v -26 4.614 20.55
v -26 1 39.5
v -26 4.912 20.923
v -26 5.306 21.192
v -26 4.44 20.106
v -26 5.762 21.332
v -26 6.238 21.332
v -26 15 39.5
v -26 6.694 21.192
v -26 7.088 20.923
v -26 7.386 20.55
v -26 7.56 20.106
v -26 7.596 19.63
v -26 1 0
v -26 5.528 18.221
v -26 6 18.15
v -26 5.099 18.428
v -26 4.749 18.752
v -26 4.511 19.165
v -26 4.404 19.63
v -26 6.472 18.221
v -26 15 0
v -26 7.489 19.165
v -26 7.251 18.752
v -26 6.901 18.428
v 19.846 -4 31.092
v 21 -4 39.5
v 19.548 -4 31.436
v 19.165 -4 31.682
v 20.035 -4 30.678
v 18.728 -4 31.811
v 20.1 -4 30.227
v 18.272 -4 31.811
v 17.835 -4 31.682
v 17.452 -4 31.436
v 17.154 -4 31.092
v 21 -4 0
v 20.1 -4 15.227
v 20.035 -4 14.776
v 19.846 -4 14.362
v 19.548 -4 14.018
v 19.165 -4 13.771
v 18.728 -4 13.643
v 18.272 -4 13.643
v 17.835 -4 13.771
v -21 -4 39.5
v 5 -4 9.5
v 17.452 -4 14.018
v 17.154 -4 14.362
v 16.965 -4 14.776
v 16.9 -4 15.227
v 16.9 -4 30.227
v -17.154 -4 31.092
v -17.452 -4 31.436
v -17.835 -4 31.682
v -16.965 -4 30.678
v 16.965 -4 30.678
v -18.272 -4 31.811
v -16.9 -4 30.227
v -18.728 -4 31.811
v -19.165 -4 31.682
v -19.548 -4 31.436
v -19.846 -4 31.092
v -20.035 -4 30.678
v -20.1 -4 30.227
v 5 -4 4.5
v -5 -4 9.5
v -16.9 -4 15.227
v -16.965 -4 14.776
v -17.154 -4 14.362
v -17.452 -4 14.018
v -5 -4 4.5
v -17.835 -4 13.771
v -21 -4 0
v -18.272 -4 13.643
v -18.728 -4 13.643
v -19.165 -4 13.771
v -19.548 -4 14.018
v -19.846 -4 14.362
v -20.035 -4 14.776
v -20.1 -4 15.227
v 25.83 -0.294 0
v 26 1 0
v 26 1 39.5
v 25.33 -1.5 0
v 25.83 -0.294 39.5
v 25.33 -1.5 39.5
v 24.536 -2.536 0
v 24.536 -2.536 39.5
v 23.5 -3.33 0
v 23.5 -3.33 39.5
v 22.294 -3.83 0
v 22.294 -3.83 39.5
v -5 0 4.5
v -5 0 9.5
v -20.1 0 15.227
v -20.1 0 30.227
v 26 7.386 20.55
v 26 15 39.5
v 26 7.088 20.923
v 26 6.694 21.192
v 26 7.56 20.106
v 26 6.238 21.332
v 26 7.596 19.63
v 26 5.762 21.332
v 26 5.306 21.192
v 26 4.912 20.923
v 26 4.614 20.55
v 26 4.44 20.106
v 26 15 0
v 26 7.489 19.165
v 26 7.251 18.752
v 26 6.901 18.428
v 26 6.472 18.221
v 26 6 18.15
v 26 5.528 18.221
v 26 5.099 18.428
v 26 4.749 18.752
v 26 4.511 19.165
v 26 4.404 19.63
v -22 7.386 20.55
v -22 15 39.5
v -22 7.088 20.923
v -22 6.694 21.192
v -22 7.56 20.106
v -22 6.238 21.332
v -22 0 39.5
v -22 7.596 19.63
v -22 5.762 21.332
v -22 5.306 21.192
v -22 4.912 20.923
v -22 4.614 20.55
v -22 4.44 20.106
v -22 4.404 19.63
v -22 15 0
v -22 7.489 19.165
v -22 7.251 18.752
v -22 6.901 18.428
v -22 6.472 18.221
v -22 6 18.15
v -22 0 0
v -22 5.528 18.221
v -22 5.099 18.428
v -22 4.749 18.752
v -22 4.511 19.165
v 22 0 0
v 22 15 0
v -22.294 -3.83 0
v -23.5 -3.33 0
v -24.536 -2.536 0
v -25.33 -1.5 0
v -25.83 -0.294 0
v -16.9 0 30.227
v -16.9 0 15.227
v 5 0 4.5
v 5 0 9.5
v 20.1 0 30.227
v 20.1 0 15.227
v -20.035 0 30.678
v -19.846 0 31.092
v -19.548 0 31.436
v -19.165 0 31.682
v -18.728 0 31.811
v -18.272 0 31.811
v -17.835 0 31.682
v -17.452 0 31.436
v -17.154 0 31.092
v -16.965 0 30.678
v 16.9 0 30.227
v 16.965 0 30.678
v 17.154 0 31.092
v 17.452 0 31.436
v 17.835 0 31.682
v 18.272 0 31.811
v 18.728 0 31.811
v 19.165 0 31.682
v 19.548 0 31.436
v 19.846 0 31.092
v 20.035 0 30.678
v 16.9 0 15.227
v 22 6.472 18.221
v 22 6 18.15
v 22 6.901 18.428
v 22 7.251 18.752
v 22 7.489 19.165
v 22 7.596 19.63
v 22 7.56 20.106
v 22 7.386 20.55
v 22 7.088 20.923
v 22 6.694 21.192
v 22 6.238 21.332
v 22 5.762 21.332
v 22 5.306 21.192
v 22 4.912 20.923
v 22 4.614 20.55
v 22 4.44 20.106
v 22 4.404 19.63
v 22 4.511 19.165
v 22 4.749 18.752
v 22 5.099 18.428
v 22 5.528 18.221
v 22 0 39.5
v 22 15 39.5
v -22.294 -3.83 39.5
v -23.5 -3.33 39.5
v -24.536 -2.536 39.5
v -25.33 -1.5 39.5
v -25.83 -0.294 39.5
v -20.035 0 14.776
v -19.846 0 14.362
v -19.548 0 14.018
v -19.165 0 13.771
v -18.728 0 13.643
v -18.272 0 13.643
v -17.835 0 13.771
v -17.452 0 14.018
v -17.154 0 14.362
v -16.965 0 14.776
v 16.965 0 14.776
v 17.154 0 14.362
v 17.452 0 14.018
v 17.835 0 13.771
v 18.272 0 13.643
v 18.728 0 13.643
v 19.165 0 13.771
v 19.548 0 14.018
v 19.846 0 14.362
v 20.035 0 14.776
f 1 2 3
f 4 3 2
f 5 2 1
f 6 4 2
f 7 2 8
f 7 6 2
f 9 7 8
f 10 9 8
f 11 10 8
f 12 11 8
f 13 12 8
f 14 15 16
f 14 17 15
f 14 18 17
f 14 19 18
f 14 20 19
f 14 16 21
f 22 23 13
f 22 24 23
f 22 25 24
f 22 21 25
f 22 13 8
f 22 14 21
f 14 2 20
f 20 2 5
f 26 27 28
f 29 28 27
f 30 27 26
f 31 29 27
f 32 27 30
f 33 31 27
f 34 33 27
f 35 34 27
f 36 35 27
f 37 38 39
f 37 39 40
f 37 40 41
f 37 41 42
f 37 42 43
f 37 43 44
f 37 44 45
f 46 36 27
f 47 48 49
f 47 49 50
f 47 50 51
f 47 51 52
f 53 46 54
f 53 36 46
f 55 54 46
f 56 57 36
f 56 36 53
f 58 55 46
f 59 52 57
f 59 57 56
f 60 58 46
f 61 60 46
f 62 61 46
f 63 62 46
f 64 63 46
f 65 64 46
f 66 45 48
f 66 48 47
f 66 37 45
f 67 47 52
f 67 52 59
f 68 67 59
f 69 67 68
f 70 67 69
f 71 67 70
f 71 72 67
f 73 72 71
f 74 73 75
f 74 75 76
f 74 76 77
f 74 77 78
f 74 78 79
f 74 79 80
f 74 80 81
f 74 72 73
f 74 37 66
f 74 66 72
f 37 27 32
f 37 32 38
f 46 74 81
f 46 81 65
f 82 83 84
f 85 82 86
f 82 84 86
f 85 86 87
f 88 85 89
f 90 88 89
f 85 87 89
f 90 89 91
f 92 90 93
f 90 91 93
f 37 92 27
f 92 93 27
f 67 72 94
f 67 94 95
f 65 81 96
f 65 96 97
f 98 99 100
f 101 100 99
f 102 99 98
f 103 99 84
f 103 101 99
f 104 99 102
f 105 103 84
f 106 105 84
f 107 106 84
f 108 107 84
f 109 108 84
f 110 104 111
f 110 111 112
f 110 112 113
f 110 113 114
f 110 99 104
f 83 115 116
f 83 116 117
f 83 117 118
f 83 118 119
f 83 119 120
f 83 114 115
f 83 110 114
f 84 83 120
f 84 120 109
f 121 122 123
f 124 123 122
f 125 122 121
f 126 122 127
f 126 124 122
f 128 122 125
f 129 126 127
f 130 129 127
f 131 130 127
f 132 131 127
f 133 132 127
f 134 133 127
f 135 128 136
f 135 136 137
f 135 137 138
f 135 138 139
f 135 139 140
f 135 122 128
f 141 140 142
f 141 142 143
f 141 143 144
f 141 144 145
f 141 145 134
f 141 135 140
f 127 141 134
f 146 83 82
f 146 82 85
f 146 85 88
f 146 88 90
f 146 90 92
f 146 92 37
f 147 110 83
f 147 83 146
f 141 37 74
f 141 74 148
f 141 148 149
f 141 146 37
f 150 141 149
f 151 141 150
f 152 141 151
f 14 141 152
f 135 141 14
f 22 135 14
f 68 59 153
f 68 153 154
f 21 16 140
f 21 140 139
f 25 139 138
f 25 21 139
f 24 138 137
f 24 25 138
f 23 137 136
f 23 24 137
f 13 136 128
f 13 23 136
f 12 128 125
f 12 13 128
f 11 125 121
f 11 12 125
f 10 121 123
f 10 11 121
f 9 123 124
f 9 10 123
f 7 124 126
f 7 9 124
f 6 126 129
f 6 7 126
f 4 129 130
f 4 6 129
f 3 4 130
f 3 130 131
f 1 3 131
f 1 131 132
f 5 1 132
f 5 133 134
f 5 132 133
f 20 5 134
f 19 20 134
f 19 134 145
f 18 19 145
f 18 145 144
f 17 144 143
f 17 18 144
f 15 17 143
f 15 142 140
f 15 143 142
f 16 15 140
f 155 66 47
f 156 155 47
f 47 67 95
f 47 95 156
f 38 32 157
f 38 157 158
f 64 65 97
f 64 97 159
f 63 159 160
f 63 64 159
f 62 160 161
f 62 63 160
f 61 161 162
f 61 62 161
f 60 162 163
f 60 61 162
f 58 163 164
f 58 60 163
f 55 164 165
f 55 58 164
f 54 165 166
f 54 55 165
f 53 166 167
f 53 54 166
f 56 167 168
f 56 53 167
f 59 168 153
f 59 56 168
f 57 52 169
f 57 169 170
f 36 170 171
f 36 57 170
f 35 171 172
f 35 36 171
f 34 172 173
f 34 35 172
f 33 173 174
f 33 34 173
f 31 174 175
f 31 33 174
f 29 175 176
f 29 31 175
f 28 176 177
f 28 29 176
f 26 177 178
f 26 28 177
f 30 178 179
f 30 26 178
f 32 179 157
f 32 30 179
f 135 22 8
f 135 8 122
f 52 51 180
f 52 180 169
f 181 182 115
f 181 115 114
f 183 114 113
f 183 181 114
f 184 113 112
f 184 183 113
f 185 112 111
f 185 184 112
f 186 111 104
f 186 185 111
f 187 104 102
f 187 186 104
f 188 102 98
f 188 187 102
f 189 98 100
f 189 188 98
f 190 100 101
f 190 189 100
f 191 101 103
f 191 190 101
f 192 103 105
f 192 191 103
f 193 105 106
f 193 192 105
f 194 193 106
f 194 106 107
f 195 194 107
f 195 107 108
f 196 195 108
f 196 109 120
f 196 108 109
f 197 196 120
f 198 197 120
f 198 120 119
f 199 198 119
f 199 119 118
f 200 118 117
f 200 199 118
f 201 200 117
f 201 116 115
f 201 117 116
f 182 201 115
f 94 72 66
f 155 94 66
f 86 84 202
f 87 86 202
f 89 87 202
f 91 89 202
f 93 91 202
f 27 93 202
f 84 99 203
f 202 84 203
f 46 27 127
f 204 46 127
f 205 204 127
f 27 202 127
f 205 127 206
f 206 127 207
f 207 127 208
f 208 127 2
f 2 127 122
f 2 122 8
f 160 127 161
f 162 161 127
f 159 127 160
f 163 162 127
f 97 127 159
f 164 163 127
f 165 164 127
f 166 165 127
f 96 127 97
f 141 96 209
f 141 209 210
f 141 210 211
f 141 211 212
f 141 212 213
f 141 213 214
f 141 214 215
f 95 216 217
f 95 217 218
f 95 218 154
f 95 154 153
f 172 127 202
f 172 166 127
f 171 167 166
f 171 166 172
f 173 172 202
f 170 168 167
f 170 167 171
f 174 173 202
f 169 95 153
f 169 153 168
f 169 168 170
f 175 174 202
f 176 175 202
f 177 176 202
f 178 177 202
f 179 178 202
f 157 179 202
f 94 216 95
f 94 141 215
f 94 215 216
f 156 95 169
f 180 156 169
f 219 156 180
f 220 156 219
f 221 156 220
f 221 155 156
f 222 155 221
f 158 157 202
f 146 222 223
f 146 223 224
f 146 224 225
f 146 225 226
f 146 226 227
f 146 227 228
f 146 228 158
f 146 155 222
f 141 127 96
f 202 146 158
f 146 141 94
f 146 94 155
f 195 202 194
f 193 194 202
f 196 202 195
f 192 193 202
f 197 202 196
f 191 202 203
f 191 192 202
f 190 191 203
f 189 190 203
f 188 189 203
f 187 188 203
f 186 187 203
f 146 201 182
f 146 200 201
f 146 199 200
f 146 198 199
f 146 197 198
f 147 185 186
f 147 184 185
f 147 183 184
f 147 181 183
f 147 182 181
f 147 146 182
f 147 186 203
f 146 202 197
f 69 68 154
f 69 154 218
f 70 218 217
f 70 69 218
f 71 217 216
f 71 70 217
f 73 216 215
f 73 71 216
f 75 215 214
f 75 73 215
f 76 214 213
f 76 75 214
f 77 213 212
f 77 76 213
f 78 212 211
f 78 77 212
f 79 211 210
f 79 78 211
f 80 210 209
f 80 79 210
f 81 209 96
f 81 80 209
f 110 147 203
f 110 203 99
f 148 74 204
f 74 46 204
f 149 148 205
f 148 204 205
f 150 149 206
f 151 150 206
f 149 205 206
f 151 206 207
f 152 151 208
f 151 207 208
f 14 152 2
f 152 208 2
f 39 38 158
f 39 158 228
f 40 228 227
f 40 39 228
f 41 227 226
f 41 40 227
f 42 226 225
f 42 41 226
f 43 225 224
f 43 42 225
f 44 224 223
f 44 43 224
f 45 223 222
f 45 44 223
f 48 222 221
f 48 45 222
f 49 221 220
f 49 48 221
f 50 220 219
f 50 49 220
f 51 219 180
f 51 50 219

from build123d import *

# Parameters (mm, degrees)
BOSS_EXTRU_1_DEPTH      = 39.5
ESQUISSE3_W             = 10
ESQUISSE3_H             = 5
ENL_V_MAT_EXTRU_1_DEPTH = 51.963222033
CUT_EXTRUDE1_DEPTH      = 64.947243881
CUT_EXTRUDE1_DEPTH_BACK = 64.947243881
SKETCH1_R               = 1.6
CUT_EXTRUDE2_DEPTH      = 51.963222033
FILLET1_R               = 5


with BuildPart() as part:
    # Esquisse1 → Boss.-Extru.1 (new body)
    with BuildSketch(Plane.XY):
        Polygon((-22, 0), (22, 0), (22, 15), (26, 15), (26, -4), (-26, -4), (-26, 15), (-22, 15), align=None)
    extrude(amount=BOSS_EXTRU_1_DEPTH)

    # Esquisse3 → Enlèv. mat.-Extru.1 (cut, through all)
    with BuildSketch(Plane.XZ.offset(4)):
        with Locations((0, 7)):
            Rectangle(ESQUISSE3_W, ESQUISSE3_H)
    extrude(amount=-ENL_V_MAT_EXTRU_1_DEPTH, mode=Mode.SUBTRACT)

    # Sketch1 → Cut-Extrude1 (cut, two sides: drawn at the far end of the back side and taken through both)
    with BuildSketch(Plane(origin=(-22, 0, 0), x_dir=(0, 0, -1), z_dir=(1, 0, 0)).offset(-CUT_EXTRUDE1_DEPTH_BACK)):
        with Locations((-19.75, 6)):
            Circle(SKETCH1_R)
    extrude(amount=CUT_EXTRUDE1_DEPTH + CUT_EXTRUDE1_DEPTH_BACK, mode=Mode.SUBTRACT)

    # Sketch2 → Cut-Extrude2 (cut, through all)
    with BuildSketch(Plane.XZ.offset(4)):
        with BuildLine():
            Line((-16.9, 30.226876468), (-16.9, 15.226876468))
            ThreePointArc((-16.9, 15.226876468), (-18.5, 13.626876468), (-20.1, 15.226876468))
            Line((-20.1, 15.226876468), (-20.1, 30.226876468))
            ThreePointArc((-20.1, 30.226876468), (-18.5, 31.826876468), (-16.9, 30.226876468))
        make_face()
        with BuildLine():
            Line((20.1, 30.226876468), (20.1, 15.226876468))
            ThreePointArc((20.1, 15.226876468), (18.5, 13.626876468), (16.9, 15.226876468))
            Line((16.9, 15.226876468), (16.9, 30.226876468))
            ThreePointArc((16.9, 30.226876468), (18.5, 31.826876468), (20.1, 30.226876468))
        make_face()
    extrude(amount=-CUT_EXTRUDE2_DEPTH, mode=Mode.SUBTRACT)

    # Fillet1
    fillet1_edges = [part.edges().sort_by_distance(p)[0] for p in [
        (26, -4, 19.75),
        (-26, -4, 19.75),
    ]]
    fillet(fillet1_edges, radius=FILLET1_R)


solid = part.part
